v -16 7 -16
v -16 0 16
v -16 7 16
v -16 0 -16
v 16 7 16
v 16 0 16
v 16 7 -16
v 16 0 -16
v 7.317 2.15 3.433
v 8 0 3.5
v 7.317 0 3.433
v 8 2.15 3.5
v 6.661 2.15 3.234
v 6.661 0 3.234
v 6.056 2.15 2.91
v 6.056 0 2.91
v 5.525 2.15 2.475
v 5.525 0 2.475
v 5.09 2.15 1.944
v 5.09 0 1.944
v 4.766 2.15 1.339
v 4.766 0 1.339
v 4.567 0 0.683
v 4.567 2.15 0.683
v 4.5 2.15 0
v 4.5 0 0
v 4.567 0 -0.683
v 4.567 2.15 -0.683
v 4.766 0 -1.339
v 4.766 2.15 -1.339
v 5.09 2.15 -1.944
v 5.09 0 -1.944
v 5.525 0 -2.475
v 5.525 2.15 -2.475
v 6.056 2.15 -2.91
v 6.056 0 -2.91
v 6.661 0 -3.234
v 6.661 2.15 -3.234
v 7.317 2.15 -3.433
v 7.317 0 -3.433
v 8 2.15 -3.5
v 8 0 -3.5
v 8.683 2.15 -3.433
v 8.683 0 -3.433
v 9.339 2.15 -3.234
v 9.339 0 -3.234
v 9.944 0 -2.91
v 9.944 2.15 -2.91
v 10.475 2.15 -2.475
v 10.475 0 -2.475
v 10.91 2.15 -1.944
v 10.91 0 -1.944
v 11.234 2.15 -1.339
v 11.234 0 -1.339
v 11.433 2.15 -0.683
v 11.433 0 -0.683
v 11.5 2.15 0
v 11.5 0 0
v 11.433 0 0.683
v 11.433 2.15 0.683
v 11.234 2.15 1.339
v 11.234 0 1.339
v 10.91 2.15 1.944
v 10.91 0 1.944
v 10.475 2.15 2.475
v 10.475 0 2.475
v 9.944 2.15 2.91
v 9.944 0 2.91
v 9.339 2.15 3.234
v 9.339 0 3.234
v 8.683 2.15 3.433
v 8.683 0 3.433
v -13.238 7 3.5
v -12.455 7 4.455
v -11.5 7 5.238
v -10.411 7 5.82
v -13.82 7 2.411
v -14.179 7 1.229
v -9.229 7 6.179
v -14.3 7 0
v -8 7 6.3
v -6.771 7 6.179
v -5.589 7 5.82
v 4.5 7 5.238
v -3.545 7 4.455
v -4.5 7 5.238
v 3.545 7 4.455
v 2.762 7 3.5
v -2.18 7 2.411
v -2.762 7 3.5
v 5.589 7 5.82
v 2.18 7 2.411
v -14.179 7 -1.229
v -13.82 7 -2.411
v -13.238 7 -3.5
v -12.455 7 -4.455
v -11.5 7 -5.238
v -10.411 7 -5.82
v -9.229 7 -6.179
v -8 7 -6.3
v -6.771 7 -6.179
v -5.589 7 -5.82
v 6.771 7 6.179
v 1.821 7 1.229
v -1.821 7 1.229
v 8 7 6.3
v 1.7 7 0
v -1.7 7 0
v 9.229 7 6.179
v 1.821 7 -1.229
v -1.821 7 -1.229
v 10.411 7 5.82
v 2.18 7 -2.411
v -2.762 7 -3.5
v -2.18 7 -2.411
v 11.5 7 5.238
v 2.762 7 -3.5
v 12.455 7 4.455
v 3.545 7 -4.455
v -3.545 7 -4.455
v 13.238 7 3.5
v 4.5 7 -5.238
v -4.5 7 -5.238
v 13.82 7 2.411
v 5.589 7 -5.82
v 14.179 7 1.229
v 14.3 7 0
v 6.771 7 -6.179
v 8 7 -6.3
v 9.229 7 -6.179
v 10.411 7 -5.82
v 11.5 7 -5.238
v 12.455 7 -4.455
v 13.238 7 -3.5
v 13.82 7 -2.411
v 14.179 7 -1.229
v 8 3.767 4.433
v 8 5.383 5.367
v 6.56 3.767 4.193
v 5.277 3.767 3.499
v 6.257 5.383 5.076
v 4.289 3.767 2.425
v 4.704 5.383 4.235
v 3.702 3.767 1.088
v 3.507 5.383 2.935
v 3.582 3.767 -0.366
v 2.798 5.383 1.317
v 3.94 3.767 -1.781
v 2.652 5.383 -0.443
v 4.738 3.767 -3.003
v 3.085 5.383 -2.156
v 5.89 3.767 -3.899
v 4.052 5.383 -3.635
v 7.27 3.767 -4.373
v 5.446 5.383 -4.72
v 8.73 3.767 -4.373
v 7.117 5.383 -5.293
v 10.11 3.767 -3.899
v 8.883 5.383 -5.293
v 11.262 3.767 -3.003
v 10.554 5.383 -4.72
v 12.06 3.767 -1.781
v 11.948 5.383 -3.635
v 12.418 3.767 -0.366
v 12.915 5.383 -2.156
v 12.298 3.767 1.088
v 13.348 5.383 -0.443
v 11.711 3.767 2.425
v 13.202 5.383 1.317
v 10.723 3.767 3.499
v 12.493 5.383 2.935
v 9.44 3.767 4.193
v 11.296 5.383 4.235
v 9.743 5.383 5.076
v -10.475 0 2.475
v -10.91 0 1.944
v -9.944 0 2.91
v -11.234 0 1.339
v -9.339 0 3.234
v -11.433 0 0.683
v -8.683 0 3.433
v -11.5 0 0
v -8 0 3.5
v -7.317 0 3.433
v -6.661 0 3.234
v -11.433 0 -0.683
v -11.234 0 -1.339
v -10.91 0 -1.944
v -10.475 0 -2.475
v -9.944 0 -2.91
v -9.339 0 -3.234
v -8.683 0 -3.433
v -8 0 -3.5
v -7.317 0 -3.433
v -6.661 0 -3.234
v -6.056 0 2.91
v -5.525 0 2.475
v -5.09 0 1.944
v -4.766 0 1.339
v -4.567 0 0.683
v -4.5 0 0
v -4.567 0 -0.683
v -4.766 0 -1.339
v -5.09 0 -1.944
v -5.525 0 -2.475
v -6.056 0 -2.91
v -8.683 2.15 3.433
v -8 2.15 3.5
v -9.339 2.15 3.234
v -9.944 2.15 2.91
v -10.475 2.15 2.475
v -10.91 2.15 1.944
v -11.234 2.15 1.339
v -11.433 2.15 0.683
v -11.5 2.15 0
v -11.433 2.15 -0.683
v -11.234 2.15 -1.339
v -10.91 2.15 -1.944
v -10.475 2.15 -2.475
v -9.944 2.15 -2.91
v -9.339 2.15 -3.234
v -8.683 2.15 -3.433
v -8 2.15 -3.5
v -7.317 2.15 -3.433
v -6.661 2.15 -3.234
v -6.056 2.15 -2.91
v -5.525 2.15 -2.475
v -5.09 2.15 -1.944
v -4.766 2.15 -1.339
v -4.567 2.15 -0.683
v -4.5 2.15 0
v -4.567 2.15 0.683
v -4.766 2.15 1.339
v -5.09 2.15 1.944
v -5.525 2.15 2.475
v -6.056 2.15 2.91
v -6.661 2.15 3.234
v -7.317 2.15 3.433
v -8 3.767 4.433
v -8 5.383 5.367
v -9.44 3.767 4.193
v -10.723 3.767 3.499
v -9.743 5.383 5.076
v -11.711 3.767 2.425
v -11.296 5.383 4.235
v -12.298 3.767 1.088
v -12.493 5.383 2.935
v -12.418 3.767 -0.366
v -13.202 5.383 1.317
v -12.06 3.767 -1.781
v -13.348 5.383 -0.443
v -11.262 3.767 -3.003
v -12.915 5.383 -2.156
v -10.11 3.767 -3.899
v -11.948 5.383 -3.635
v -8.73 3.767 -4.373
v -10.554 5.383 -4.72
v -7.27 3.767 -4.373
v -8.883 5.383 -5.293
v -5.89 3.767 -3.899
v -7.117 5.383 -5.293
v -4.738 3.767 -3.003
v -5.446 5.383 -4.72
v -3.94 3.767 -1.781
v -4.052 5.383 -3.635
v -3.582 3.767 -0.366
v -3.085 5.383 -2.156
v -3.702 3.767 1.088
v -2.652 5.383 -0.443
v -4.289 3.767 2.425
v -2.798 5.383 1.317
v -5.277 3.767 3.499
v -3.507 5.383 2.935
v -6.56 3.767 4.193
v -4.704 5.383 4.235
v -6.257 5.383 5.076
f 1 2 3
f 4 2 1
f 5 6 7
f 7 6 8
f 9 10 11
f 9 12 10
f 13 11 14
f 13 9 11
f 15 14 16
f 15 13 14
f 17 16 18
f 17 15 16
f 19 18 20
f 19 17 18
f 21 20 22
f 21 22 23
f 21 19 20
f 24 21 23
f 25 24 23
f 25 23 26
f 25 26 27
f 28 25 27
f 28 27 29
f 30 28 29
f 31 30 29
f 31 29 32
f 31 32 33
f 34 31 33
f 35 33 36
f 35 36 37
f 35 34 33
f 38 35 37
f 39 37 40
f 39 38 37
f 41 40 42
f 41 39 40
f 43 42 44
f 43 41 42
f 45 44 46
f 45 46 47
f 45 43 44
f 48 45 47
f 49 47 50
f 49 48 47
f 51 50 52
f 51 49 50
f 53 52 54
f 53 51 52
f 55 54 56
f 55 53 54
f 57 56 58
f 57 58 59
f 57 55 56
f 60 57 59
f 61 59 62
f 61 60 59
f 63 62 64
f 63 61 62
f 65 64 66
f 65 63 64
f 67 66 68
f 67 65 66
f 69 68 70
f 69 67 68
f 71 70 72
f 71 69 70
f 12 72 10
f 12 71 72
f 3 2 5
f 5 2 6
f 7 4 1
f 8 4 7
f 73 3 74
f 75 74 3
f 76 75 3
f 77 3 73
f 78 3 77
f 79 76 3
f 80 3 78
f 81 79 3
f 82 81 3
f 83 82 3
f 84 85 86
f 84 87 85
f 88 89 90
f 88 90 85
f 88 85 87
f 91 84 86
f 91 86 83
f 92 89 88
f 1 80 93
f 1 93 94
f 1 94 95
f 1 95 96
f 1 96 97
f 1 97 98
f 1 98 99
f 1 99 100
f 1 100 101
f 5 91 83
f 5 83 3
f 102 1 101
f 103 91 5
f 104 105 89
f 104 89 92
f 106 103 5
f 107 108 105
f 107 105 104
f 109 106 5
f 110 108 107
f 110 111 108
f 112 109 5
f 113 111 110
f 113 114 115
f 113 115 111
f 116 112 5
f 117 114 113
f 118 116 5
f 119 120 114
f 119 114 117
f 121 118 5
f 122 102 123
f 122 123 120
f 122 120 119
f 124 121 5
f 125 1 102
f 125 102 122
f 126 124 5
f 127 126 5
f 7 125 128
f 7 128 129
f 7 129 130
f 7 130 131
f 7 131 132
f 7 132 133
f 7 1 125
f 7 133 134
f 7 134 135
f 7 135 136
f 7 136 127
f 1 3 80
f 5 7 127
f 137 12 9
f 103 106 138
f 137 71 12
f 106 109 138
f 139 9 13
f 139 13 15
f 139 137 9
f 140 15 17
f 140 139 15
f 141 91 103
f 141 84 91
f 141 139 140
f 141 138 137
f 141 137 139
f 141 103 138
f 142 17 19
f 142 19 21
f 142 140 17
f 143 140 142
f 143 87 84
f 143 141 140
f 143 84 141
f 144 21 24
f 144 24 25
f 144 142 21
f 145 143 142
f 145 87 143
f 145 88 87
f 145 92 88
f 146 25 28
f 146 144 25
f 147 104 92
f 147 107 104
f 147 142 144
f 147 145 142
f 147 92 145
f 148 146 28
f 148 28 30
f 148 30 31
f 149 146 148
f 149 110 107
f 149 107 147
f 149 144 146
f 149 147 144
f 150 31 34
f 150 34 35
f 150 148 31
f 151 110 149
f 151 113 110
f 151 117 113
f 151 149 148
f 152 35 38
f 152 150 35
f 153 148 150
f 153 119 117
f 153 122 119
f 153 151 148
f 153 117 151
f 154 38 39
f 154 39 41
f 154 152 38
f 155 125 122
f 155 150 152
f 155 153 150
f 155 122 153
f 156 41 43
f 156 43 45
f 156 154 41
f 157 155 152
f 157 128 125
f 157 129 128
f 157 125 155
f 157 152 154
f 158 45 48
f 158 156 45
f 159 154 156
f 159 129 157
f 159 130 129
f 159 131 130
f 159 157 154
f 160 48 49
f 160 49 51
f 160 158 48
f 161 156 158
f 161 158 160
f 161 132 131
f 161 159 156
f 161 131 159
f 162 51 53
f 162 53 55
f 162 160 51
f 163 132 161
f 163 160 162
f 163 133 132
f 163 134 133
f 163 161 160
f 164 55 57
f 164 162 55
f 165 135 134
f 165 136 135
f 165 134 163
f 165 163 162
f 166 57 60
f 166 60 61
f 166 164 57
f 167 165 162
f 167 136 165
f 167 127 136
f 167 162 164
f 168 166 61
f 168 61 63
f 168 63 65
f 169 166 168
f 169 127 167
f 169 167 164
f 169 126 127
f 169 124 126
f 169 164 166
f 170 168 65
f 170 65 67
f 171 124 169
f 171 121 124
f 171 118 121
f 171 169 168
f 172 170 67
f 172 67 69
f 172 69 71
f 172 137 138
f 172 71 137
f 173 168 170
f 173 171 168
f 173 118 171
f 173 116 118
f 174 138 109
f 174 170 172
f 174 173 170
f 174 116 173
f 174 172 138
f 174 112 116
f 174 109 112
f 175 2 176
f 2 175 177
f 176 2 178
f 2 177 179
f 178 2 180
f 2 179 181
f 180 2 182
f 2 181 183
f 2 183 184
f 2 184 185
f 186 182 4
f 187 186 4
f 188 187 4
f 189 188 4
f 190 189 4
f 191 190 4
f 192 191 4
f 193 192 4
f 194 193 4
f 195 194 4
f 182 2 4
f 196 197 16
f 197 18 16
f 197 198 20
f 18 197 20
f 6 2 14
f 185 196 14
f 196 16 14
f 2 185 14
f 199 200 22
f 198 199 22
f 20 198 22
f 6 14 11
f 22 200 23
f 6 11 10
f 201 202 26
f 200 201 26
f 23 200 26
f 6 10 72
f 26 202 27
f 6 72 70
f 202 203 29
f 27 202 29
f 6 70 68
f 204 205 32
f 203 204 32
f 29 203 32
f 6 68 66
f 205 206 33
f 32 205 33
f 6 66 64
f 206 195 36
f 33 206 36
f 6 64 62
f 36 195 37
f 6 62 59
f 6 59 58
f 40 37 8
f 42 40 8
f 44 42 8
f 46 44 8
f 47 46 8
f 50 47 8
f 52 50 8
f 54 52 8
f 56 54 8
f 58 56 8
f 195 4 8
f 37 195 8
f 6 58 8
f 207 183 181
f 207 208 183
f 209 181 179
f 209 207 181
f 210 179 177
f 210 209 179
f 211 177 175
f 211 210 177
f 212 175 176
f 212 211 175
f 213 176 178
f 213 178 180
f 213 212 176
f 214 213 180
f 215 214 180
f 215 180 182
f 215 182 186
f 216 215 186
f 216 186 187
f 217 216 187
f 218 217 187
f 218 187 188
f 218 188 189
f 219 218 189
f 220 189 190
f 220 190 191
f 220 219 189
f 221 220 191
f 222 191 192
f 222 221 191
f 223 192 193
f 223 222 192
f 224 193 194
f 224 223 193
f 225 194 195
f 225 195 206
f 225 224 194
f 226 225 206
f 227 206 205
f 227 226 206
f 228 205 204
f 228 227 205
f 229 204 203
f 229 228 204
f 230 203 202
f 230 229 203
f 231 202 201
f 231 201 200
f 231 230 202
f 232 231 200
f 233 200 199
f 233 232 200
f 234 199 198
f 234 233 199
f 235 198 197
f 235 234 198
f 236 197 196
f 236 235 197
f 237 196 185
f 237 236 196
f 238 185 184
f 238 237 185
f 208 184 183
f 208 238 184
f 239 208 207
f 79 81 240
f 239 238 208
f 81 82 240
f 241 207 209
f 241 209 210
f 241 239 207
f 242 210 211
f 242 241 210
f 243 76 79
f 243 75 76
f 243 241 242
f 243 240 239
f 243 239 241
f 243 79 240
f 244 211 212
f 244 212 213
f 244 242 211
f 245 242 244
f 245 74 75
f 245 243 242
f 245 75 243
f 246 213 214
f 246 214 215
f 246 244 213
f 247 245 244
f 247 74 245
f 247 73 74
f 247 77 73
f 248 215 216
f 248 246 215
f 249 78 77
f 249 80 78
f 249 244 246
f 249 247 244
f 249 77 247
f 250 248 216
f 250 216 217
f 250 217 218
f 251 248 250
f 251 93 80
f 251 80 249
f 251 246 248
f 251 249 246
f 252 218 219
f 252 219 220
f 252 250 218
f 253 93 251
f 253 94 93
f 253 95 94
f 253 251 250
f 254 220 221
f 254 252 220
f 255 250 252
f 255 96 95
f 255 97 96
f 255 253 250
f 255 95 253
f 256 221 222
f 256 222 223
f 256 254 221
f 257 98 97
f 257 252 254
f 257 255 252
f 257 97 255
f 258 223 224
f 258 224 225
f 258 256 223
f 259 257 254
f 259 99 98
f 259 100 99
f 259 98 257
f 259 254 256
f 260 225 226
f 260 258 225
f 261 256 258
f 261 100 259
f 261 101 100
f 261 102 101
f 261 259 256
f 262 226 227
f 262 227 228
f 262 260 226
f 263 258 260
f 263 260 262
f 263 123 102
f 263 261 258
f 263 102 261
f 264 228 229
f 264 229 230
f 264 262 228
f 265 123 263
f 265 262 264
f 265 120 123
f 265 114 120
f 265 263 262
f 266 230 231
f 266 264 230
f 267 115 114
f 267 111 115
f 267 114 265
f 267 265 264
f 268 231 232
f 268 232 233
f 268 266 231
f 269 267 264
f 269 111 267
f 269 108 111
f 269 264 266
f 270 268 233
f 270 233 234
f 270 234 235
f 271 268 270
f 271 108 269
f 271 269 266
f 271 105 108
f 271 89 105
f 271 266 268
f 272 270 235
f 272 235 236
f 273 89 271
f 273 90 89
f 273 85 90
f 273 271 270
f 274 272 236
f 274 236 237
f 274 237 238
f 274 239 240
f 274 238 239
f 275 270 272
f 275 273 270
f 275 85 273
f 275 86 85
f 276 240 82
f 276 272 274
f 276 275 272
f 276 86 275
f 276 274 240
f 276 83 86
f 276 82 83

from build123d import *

# Parameters (mm, degrees)
SKETCH1_W                                      = 32
SKETCH1_H                                      = 32
BOSS_EXTRUDE1_DEPTH                            = 7
CSK_FOR_M6_FLAT_HEAD_MACHINE_SCREW1_AT_2_COUNT = 2
CSK_FOR_M6_FLAT_HEAD_MACHINE_SCREW1_AT_2_PITCH = 16


with BuildPart() as part:
    # Sketch1 → Boss-Extrude1 (new body)
    with BuildSketch(Plane(origin=(0, 0, 0), x_dir=(1, 0, 0), z_dir=(0, 1, 0))):
        Rectangle(SKETCH1_W, SKETCH1_H)
    extrude(amount=BOSS_EXTRUDE1_DEPTH)

    # Sketch3 → CSK for M6 Flat Head Machine Screw1 (revolve, cut)
    with BuildSketch(Plane(origin=(-8, 7, 0), x_dir=(0, 0, 1), z_dir=(1, 0, 0))):
        Polygon((0, 0), (0, 7), (3.5, 7), (3.5, 4.849742261), (6.3, 0), align=None)
    csk_for_m6_flat_head_machine_screw1 = revolve(axis=Axis((-8, 13.35, 0), (0, -1, 0)), mode=Mode.SUBTRACT)

    # CSK for M6 Flat Head Machine Screw1 at 2: CSK for M6 Flat Head Machine Screw1 ×2
    with Locations(*[(i * CSK_FOR_M6_FLAT_HEAD_MACHINE_SCREW1_AT_2_PITCH, 0, 0) for i in range(1, CSK_FOR_M6_FLAT_HEAD_MACHINE_SCREW1_AT_2_COUNT)]):
        add(csk_for_m6_flat_head_machine_screw1, mode=Mode.SUBTRACT)


solid = part.part
